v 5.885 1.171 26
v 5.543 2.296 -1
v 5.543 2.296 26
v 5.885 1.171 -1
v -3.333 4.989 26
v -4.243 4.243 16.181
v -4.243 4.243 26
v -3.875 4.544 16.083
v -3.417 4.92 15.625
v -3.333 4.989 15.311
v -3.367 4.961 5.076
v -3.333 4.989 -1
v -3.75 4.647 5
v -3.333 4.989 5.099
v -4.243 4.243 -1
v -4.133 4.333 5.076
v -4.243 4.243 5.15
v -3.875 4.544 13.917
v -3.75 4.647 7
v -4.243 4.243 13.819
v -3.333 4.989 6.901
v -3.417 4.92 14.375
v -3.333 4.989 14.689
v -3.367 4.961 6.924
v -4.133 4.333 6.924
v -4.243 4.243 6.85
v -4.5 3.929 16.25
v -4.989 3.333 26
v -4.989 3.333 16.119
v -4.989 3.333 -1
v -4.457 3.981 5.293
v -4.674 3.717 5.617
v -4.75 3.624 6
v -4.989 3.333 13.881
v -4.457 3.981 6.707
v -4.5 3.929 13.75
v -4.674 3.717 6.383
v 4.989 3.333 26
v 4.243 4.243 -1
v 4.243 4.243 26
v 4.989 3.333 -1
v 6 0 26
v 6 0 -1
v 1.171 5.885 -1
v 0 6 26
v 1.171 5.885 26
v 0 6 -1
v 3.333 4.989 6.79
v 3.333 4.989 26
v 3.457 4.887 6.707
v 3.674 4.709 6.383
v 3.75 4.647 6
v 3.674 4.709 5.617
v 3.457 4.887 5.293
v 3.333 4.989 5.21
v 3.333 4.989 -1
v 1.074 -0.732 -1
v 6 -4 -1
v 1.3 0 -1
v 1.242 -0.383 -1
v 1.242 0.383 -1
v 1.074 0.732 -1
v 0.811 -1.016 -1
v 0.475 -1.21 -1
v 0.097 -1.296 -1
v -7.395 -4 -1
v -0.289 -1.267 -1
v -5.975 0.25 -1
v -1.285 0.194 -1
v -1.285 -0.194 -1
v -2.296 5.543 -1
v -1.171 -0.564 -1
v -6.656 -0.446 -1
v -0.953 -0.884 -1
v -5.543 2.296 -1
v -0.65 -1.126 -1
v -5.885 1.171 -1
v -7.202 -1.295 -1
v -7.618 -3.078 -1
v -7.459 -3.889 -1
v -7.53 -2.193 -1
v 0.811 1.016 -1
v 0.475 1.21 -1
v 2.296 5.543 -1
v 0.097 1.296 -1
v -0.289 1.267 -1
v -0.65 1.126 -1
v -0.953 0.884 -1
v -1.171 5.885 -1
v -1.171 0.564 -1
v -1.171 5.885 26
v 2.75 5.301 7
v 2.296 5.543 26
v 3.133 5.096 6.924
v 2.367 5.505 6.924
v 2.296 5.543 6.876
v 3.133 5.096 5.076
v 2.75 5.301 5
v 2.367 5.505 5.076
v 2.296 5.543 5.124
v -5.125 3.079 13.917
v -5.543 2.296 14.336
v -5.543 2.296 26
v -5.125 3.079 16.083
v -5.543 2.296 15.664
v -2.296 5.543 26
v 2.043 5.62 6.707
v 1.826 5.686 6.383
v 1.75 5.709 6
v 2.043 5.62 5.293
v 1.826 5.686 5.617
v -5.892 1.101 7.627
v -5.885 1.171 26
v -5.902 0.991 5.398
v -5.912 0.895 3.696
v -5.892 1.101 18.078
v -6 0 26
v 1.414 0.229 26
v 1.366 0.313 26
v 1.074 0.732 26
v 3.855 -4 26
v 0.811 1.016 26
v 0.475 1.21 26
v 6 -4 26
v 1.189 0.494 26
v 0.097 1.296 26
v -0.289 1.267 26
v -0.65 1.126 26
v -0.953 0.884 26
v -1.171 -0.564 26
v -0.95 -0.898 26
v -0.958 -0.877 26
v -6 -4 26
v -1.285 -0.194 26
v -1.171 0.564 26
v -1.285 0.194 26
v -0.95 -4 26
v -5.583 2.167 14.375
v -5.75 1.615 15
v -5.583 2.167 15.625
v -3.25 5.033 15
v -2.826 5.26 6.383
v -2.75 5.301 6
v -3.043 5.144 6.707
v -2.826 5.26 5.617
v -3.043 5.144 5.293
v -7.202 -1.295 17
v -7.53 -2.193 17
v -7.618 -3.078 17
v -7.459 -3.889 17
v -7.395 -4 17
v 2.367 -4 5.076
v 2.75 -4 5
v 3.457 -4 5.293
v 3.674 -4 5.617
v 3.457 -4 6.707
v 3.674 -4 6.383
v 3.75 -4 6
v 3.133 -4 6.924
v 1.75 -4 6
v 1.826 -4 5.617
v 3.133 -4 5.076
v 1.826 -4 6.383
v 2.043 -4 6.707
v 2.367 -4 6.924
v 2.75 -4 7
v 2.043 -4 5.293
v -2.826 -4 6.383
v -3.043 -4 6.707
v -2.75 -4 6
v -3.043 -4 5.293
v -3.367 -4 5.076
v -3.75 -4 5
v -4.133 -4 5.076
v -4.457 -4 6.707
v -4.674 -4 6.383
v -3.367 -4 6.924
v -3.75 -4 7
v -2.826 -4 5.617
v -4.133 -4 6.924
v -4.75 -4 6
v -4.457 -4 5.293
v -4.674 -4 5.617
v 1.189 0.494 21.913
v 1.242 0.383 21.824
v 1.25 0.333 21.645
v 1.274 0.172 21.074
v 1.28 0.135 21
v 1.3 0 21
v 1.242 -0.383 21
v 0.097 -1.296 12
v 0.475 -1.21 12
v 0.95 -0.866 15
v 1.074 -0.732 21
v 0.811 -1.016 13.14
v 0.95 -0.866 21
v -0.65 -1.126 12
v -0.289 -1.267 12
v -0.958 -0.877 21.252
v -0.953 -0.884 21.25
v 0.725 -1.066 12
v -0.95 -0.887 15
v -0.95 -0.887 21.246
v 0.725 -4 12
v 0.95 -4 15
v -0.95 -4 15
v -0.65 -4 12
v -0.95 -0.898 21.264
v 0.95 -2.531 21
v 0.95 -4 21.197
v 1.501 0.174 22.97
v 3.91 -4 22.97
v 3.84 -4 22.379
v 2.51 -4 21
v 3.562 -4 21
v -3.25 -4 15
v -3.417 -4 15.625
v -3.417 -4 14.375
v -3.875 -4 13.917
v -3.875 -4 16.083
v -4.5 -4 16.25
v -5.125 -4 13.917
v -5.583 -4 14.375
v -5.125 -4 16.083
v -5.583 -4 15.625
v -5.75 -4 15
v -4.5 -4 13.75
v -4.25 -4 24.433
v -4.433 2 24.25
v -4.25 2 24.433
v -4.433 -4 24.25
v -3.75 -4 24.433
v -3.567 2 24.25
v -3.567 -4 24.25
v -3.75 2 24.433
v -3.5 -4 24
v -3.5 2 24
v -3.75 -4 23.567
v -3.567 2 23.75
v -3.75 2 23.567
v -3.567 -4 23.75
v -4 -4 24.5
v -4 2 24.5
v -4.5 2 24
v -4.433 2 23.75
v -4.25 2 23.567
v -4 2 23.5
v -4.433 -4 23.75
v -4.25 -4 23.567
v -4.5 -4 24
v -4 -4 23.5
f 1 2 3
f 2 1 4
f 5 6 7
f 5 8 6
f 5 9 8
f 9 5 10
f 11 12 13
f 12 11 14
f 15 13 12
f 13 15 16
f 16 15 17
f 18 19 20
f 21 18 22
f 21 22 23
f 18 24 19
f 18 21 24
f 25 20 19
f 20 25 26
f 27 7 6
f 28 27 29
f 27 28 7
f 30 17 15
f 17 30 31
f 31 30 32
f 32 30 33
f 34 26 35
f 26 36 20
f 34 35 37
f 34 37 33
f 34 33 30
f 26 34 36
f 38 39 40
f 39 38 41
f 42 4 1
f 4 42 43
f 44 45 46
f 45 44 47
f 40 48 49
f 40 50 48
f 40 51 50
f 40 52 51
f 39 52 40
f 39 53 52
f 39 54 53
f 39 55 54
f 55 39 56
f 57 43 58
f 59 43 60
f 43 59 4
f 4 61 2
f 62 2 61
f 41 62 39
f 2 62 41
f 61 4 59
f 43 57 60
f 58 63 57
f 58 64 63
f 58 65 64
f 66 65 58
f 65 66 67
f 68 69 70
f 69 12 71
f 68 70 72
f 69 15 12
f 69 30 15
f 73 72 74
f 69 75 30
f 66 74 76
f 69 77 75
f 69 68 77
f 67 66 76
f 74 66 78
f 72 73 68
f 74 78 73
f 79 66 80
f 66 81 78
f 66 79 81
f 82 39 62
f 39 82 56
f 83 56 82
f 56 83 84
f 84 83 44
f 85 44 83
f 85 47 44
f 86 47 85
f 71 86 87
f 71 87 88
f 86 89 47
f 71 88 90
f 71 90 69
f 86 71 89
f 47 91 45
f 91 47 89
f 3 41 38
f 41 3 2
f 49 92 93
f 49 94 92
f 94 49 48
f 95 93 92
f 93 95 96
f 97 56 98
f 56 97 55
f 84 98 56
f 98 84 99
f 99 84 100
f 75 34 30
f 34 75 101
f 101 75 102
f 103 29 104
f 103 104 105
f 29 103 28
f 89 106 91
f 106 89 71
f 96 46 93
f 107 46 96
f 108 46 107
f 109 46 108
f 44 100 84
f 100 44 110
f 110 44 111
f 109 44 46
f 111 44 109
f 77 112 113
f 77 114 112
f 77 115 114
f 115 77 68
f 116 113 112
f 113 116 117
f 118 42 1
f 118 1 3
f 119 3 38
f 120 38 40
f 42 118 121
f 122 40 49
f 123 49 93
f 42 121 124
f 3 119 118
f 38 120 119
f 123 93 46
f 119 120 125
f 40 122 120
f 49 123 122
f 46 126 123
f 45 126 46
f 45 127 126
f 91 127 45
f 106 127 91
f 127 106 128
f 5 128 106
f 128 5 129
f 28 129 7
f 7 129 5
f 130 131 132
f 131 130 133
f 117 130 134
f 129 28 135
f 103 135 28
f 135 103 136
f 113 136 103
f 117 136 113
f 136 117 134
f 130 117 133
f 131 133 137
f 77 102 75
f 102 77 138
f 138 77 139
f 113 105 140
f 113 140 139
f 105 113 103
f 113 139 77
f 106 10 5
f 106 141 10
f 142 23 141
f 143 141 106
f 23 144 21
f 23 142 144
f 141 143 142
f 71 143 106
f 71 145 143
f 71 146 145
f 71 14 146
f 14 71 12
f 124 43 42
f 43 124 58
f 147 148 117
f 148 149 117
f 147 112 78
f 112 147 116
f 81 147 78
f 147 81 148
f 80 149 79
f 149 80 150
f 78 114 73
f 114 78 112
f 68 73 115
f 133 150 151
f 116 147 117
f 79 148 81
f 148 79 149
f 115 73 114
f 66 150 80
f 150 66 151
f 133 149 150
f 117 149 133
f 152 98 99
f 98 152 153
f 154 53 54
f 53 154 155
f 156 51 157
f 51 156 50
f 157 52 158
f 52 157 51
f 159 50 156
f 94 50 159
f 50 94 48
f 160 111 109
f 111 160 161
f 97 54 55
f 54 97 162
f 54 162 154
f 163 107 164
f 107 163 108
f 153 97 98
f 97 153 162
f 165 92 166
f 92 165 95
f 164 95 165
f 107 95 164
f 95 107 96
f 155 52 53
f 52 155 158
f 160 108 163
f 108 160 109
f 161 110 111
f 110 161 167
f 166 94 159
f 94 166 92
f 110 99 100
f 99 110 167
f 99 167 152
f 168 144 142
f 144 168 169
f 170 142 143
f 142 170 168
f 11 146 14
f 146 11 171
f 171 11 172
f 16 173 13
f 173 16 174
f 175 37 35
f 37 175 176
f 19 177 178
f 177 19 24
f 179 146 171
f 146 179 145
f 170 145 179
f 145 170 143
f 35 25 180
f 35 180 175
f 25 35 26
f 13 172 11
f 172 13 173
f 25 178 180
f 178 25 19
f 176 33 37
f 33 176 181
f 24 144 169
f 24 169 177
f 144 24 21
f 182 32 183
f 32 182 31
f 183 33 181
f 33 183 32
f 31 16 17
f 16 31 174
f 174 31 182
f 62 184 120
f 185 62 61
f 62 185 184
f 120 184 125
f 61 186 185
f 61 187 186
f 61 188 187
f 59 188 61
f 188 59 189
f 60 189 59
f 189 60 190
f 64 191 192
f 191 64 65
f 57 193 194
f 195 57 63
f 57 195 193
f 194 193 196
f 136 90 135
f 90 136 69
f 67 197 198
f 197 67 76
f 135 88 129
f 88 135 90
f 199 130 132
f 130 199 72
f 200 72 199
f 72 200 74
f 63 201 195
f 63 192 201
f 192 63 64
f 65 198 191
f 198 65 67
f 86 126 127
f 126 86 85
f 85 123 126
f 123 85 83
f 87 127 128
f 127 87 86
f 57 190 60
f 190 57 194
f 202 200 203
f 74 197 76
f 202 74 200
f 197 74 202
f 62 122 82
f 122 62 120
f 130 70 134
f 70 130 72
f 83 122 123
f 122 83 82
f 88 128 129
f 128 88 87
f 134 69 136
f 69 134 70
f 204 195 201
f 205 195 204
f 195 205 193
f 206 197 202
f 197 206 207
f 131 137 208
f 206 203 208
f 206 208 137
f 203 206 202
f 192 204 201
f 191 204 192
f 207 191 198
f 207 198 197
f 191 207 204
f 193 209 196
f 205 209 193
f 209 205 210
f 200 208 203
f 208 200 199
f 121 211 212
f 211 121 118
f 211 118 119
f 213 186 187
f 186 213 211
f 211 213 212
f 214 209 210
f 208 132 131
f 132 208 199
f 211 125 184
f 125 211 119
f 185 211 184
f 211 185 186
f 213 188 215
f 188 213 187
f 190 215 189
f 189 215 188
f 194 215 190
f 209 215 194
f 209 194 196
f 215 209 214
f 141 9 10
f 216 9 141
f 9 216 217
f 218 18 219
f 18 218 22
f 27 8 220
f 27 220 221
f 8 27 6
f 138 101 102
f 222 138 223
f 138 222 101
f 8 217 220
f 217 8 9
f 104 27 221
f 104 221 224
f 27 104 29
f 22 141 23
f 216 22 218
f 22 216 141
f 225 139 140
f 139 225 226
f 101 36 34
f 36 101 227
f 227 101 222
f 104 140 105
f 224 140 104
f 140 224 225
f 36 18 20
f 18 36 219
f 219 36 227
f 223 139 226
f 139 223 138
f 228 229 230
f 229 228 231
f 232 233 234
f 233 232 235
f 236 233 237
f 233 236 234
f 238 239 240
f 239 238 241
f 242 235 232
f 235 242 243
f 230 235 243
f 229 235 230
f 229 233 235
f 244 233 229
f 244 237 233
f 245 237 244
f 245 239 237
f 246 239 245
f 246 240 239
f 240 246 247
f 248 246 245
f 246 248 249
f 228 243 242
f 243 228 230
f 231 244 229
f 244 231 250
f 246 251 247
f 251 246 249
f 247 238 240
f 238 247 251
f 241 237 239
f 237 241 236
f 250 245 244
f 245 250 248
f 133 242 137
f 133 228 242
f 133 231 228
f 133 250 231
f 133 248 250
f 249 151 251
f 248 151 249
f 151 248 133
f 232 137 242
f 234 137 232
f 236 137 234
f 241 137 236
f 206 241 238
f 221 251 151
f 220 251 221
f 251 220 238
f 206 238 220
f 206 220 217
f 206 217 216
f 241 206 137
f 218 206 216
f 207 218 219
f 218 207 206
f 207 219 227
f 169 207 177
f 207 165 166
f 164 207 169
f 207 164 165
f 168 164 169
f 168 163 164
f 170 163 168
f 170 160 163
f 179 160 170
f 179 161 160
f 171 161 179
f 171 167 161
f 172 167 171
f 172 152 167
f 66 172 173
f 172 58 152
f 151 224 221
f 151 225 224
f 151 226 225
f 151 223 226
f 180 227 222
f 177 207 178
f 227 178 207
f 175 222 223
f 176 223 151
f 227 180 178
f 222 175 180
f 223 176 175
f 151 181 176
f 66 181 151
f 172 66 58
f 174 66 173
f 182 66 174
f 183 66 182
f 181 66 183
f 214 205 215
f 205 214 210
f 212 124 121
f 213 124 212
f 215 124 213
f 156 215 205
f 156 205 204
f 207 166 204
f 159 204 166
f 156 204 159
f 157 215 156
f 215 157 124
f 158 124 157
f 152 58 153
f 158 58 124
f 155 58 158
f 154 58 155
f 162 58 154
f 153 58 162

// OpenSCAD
// file: configuration.scad
// Increase this if your slicer or printer make holes too tight.
extra_radius = 0.1;

// OD = outside diameter, corner to corner.
m3_nut_od = 6.1;
m3_nut_radius = m3_nut_od/2 + 0.2 + extra_radius;
m3_washer_radius = 3.5 + extra_radius;

// Major diameter of metric 3mm thread.
m3_major = 2.85;
m3_radius = m3_major/2 + extra_radius;
m3_wide_radius = m3_major/2 + extra_radius + 0.2;

// NEMA17 stepper motors.
motor_shaft_diameter = 5;
motor_shaft_radius = motor_shaft_diameter/2 + extra_radius;

// Frame brackets. M3x8mm screws work best with 3.6 mm brackets.
thickness = 3.6;

// OpenBeam or Misumi. Currently only 15x15 mm, but there is a plan
// to make models more parametric and allow 20x20 mm in the future.
extrusion = 15;

// Placement for the NEMA17 stepper motors.
motor_offset = 44;
motor_length = 47;
// main file
include <configuration.scad>;

height = 26;
height2 = 26;
tunnel = 2.4;
face_offset = 4;

module nanoswitchHoles() {
   translate([ 6.5/2,0,-15]) cylinder(h=22,r=1,$fn=16);
   translate([-6.5/2,0,-15]) cylinder(h=22,r=1,$fn=16);
}

module nanoswitch() {
  difference() {
      translate([-12.8/2,-1,0]) cube([12.8,6.2,5.75]);
      translate([0,0,-1]) nanoswitchHoles();
    }
  #translate([12.8/2-4,6.2-1,1]) cylinder(h=5.75-2,r=0.45,$fn=16);
}

module hotEndHullProxy() {
  hull() {
    translate([0,0,1]) cylinder(r=3,h=17,$fn=24);
    cylinder(r=9,h=13,$fn=6);
  }
}

// main hole centered at (0,0).  Bottom extends -1 in the Z direction, for
// clean unions with support structure.  Bottom intended to be at z=0 plane
module retractable() {
  difference() {
    union() {
      translate([ 0, 0,-1]) cylinder(r=6, h=height+1, $fn=32);
      translate([-6,-6,-1]) cube([12,  6,   height+1]);
      hull() {
        translate([-6,-4,-1]) cube([2,4,height+1]);
        translate([-2,2,15]) cylinder(r=3,h=4,$fn=16);
        translate([-8+4,-2,-1]) rotate([0,0,-50]) scale([1.5,2,1]) cylinder(r=2,h=18,$fn=24);
      }
    }

    // central drill hole
    cylinder(r=tunnel/2+extra_radius, h=3*height, center=true, $fn=21);

    // main probe handle slot
    translate([-(tunnel-0.5)/2, -7, 12]) hull() {
      translate([0,0,3])  cube([tunnel-0.5  ,7,15]);
      translate([.3,0,0]) cube([tunnel-1.025,7,1]);
    }

    // retracted probe catch ledge
    hull() {
      translate([tunnel/2, 0, 21]) rotate([0, 0,-150]) {
        translate([0,2,1]) cube([tunnel,8,9]);
        rotate([0,-10,0])  cube([tunnel,7,2]);
      }
      translate([0,0,21])cylinder(r=tunnel/2,h=15,$fn=18);
    }

    // Safety needle spring.
    translate([-4.5, 0, height-11]) rotate([90, 0, 0])
      translate([0,0,-8]) cylinder(r=2.5/2, h=20, $fn=12);
    translate([-4, 0, height-2]) rotate([90, 0, 0])
      translate([0,0,-2]) cylinder(r=1/2, h=20, $fn=12);
    
    // Flat front face.
    translate([0, -face_offset-10, height/2]) cube([30, 20, 2*height], center=true);

    // make sure we clear the hot-end hull on top
    //translate([0,12.5,-1]) hotEndHullProxy();

    // Sub-miniature micro switch.
    translate([-2.5+2, -face_offset, 5]) {
      translate([0,0,1]) rotate([90,0,0]) { 
        %nanoswitch();
        nanoswitchHoles();
      }
    }
  }
}

// put solid layer below holes for quelab printer
//union(){
//  translate([0,0,0.15])
    retractable();
//  color("Cyan") {
//    hull() {
//      translate([-11,-4.5,0]) cube([7,10,.3]);
//      translate([-11,6.5,0]) cylinder(h=.3,r=5.5,$fn=16);
//    }
//    hull() {
//      translate([4,-4.5,0]) cube([2,10,.3]);
//      translate([ 11,6.5,0]) cylinder(h=.3,r=5.5,$fn=16);
//    }
//    translate([-4.5,-4.5,0]) cube([9,10,.3]);
//  }
//}

// show in relation to effector head :
//use <effectorC.scad>;
//%translate([0,12.5,-4]) scale([1.02,1.02,1]) effector();
